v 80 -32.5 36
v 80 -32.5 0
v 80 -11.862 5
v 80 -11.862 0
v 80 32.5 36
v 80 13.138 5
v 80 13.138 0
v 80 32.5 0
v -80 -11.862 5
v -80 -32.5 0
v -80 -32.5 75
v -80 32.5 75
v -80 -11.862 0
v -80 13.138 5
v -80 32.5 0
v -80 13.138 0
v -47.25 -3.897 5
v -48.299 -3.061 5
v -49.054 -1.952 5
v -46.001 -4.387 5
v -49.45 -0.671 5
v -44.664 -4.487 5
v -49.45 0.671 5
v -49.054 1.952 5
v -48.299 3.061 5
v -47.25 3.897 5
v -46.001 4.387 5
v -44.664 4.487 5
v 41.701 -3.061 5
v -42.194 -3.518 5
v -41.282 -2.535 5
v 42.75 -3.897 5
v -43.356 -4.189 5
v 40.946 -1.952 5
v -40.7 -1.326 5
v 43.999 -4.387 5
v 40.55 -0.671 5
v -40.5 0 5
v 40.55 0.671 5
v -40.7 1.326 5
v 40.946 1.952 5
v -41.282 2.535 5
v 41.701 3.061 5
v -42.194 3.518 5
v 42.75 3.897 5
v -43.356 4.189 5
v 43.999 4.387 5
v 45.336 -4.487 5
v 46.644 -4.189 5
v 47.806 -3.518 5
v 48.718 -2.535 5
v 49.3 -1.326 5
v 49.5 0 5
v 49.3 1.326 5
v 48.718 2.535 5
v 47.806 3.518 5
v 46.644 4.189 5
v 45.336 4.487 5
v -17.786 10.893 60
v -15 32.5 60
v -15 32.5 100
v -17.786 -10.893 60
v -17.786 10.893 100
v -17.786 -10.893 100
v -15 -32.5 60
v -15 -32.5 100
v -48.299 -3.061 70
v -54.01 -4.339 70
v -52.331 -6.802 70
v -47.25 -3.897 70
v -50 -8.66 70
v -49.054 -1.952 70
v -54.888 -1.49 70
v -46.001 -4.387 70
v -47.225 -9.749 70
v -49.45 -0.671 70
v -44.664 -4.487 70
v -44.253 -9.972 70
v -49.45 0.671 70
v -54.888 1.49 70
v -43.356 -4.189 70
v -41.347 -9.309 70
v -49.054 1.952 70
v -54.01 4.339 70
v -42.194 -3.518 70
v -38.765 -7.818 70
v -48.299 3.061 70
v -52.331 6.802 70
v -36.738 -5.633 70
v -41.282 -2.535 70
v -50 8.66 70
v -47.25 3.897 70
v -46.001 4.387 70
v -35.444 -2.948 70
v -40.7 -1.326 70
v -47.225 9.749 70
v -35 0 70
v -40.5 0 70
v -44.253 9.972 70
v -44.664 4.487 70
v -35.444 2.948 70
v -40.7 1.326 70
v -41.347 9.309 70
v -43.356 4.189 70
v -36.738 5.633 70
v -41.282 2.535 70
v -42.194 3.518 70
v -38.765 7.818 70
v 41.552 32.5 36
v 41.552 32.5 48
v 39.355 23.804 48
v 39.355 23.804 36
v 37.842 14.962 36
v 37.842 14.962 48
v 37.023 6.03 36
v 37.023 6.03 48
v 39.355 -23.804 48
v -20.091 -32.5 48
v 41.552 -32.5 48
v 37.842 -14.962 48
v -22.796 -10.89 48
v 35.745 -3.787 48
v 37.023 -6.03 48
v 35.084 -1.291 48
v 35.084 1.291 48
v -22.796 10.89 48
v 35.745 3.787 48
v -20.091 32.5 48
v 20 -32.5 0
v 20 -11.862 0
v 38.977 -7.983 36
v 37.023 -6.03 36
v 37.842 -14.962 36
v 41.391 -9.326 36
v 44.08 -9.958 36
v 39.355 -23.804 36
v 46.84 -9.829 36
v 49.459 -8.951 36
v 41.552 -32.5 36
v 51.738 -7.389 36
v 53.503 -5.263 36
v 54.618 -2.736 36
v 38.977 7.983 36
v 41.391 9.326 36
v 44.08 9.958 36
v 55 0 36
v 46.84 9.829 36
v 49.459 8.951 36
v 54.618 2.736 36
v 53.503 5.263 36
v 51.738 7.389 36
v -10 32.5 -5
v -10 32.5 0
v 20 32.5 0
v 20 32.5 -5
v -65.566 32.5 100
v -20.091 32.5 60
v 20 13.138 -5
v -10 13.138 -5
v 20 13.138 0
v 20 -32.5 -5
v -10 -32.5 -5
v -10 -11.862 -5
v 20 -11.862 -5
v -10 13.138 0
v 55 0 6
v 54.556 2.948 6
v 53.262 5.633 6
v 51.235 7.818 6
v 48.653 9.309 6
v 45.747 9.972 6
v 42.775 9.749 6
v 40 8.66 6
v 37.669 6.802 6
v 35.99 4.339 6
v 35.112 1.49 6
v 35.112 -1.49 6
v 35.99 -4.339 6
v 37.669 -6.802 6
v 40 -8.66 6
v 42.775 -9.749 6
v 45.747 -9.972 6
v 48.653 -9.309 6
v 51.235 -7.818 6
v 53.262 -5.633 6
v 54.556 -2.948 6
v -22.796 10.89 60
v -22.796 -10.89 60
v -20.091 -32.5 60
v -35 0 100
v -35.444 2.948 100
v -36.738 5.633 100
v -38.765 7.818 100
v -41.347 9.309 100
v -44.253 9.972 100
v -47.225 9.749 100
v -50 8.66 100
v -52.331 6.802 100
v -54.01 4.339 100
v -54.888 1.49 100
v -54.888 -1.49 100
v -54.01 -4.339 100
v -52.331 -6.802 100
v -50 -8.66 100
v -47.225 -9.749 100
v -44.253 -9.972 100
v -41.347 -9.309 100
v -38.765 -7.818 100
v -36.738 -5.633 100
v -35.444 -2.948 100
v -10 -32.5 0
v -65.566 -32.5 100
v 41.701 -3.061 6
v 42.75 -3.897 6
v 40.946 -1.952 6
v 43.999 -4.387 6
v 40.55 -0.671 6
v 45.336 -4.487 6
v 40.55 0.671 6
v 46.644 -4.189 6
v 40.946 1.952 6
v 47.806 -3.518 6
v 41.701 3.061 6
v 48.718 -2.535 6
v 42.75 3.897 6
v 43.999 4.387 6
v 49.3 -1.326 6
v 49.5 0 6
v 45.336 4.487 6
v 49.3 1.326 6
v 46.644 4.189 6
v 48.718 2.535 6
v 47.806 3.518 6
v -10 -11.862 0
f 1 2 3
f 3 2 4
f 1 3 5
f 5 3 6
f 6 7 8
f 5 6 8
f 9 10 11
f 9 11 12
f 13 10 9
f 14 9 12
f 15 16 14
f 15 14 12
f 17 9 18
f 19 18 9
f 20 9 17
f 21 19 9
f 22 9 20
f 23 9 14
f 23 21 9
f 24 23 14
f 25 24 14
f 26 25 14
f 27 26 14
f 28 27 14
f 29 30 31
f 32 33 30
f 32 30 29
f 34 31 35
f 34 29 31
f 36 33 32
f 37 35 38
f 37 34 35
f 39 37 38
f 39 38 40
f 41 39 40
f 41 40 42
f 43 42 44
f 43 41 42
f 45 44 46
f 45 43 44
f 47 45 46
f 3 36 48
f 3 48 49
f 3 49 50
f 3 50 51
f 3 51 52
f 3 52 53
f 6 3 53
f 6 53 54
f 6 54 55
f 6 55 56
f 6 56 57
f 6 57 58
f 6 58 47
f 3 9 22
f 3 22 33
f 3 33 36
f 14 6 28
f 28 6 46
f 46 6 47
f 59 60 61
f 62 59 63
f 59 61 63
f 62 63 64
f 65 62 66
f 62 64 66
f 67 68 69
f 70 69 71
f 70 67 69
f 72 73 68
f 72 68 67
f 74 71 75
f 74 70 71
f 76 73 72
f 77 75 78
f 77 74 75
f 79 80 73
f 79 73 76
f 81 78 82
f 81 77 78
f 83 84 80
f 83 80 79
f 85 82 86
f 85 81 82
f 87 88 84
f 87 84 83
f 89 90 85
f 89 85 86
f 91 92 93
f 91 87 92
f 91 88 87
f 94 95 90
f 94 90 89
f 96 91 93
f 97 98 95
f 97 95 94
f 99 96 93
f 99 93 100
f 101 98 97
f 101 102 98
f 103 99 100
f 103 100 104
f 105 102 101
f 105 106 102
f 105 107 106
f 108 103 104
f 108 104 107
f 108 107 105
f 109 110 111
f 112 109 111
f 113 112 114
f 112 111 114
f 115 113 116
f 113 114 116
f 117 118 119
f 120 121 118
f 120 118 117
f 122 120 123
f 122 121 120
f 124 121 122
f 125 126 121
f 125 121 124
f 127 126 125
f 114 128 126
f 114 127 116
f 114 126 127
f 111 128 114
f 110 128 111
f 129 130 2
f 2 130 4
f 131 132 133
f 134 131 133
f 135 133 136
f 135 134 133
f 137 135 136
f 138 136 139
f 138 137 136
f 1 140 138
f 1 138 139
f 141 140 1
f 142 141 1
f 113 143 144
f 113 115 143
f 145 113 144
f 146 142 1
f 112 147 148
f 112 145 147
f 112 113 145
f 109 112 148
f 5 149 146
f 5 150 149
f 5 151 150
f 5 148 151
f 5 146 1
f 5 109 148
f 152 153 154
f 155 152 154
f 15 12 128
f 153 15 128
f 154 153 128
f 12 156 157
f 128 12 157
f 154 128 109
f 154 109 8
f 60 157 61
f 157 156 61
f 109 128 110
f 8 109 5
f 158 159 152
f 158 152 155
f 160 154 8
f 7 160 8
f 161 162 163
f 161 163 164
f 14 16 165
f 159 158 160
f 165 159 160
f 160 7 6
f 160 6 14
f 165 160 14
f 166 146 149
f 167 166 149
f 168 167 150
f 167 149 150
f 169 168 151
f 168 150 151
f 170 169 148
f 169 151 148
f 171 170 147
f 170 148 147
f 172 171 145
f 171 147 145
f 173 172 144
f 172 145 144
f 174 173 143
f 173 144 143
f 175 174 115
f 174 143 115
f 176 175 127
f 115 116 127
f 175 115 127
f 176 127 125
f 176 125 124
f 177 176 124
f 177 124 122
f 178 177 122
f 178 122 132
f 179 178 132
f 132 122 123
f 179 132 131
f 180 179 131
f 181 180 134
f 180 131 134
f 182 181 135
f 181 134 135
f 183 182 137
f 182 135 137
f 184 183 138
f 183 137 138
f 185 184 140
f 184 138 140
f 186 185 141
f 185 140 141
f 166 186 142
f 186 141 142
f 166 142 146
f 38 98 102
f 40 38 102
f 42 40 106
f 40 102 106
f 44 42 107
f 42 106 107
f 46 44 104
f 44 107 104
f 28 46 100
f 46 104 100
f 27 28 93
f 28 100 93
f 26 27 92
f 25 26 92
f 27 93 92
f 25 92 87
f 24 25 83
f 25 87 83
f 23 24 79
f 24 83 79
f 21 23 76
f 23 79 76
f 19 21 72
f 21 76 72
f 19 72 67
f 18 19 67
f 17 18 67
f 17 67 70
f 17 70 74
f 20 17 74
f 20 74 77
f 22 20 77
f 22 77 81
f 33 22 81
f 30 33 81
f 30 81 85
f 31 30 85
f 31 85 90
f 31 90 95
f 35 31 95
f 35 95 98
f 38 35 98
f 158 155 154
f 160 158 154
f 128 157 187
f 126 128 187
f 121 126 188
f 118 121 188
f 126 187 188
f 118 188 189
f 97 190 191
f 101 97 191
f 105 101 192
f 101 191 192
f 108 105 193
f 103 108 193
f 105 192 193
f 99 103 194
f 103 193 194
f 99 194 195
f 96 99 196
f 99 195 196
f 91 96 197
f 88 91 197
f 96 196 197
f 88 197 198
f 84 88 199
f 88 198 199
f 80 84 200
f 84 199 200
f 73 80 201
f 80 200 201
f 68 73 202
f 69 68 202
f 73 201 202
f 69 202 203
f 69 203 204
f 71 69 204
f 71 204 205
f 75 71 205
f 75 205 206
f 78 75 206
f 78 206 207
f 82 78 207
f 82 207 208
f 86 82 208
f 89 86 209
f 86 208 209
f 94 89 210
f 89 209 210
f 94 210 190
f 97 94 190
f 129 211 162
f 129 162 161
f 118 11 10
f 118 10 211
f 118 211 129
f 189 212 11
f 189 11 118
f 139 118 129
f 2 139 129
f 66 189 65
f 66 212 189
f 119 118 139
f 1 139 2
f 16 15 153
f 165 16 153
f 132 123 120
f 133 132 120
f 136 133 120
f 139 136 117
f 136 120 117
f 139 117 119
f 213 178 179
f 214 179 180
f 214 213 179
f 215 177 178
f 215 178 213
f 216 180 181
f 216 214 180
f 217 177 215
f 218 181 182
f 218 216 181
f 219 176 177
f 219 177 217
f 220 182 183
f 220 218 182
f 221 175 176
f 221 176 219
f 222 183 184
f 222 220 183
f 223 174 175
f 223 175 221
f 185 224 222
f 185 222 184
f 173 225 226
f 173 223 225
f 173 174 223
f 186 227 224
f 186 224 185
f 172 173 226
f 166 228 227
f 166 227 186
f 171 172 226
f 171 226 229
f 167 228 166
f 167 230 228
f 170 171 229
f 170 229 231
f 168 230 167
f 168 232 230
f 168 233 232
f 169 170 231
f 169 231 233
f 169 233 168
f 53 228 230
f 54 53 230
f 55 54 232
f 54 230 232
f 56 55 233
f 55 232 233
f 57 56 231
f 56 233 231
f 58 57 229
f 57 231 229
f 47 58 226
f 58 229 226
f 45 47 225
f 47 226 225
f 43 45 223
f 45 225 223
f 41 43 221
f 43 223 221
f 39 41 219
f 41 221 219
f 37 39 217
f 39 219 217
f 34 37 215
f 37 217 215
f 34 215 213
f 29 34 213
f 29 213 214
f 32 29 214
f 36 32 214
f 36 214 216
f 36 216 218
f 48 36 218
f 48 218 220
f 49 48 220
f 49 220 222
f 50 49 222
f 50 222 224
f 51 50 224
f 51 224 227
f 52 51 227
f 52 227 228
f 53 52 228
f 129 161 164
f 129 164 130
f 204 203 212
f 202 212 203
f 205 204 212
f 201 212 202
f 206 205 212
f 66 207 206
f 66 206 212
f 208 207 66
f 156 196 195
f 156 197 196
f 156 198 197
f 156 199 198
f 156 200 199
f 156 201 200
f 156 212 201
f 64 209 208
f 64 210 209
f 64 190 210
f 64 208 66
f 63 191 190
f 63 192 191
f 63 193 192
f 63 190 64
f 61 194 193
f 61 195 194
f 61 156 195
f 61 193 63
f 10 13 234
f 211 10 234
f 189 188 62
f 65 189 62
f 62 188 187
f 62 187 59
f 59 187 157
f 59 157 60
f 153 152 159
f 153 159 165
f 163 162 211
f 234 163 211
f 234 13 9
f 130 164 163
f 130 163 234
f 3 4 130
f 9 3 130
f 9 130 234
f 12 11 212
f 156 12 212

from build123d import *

# Parameters (mm, degrees)
SKETCH_W        = 160
SKETCH_H        = 65
PAD_DEPTH       = 100
POCKET_DEPTH    = 65.001
SKETCH002_R     = 4.5
POCKET001_DEPTH = 100.001
SKETCH003_R     = 10
POCKET002_DEPTH = 30
SKETCH004_R     = 170
POCKET003_DEPTH = 40
SKETCH005_R     = 175
POCKET004_DEPTH = 12
SKETCH006_R     = 115
POCKET005_DEPTH = 12
SKETCH007_R     = 4.5
POCKET006_DEPTH = 36.001
SKETCH008_R     = 10
POCKET009_DEPTH = 30
SKETCH009_W     = 30
SKETCH009_H     = 14.232688
PAD001_DEPTH    = 65
SKETCH010_W     = 25
SKETCH010_H     = 15.667085
POCKET010_DEPTH = 160.001


with BuildPart() as part:
    # Sketch → Pad (new body)
    with BuildSketch(Plane.XY):
        Rectangle(SKETCH_W, SKETCH_H)
    extrude(amount=PAD_DEPTH)

    # Sketch001 → Pocket (cut, through all)
    with BuildSketch(Plane.XZ.offset(32.5)):
        Polygon((-80, 100), (-80, 75), (-65.566243, 100), align=None)
    extrude(amount=-POCKET_DEPTH, mode=Mode.SUBTRACT)

    # Sketch002 → Pocket001 (cut, through all)
    with BuildSketch(Plane.XY.offset(100)):
        with Locations((-45, 0)):
            Circle(SKETCH002_R)
    extrude(amount=-POCKET001_DEPTH, mode=Mode.SUBTRACT)

    # Sketch003 → Pocket002 (cut)
    with BuildSketch(Plane.XY.offset(100)):
        with Locations((-45, 0)):
            Circle(SKETCH003_R)
    extrude(amount=-POCKET002_DEPTH, mode=Mode.SUBTRACT)

    # Sketch004 → Pocket003 (cut)
    with BuildSketch(Plane.XY.offset(100)):
        with Locations((151.864466, 0)):
            Circle(SKETCH004_R)
    extrude(amount=-POCKET003_DEPTH, mode=Mode.SUBTRACT)

    # Sketch005 → Pocket004 (cut)
    with BuildSketch(Plane.XY.offset(60)):
        with Locations((151.864466, 0)):
            Circle(SKETCH005_R)
    extrude(amount=-POCKET004_DEPTH, mode=Mode.SUBTRACT)

    # Sketch006 → Pocket005 (cut)
    with BuildSketch(Plane.XY.offset(48)):
        with Locations((151.864466, 0)):
            Circle(SKETCH006_R)
    extrude(amount=-POCKET005_DEPTH, mode=Mode.SUBTRACT)

    # Sketch007 → Pocket006 (cut, through all)
    with BuildSketch(Plane.XY.offset(36)):
        with Locations((45, 0)):
            Circle(SKETCH007_R)
    extrude(amount=-POCKET006_DEPTH, mode=Mode.SUBTRACT)

    # Sketch008 → Pocket009 (cut, symmetric)
    with BuildSketch(Plane.XY.offset(36)):
        with Locations((45, 0)):
            Circle(SKETCH008_R)
    extrude(amount=POCKET009_DEPTH, both=True, mode=Mode.SUBTRACT)

    # Sketch009 → Pad001 (new body)
    with BuildSketch(Plane.XZ.offset(32.5)):
        with Locations((5, 2.116344)):
            Rectangle(SKETCH009_W, SKETCH009_H)
    extrude(amount=-PAD001_DEPTH)

    # Sketch010 → Pocket010 (cut, through all)
    with BuildSketch(Plane.YZ.offset(80)):
        with Locations((0.638302, -2.833543)):
            Rectangle(SKETCH010_W, SKETCH010_H)
    extrude(amount=-POCKET010_DEPTH, mode=Mode.SUBTRACT)


solid = part.part
